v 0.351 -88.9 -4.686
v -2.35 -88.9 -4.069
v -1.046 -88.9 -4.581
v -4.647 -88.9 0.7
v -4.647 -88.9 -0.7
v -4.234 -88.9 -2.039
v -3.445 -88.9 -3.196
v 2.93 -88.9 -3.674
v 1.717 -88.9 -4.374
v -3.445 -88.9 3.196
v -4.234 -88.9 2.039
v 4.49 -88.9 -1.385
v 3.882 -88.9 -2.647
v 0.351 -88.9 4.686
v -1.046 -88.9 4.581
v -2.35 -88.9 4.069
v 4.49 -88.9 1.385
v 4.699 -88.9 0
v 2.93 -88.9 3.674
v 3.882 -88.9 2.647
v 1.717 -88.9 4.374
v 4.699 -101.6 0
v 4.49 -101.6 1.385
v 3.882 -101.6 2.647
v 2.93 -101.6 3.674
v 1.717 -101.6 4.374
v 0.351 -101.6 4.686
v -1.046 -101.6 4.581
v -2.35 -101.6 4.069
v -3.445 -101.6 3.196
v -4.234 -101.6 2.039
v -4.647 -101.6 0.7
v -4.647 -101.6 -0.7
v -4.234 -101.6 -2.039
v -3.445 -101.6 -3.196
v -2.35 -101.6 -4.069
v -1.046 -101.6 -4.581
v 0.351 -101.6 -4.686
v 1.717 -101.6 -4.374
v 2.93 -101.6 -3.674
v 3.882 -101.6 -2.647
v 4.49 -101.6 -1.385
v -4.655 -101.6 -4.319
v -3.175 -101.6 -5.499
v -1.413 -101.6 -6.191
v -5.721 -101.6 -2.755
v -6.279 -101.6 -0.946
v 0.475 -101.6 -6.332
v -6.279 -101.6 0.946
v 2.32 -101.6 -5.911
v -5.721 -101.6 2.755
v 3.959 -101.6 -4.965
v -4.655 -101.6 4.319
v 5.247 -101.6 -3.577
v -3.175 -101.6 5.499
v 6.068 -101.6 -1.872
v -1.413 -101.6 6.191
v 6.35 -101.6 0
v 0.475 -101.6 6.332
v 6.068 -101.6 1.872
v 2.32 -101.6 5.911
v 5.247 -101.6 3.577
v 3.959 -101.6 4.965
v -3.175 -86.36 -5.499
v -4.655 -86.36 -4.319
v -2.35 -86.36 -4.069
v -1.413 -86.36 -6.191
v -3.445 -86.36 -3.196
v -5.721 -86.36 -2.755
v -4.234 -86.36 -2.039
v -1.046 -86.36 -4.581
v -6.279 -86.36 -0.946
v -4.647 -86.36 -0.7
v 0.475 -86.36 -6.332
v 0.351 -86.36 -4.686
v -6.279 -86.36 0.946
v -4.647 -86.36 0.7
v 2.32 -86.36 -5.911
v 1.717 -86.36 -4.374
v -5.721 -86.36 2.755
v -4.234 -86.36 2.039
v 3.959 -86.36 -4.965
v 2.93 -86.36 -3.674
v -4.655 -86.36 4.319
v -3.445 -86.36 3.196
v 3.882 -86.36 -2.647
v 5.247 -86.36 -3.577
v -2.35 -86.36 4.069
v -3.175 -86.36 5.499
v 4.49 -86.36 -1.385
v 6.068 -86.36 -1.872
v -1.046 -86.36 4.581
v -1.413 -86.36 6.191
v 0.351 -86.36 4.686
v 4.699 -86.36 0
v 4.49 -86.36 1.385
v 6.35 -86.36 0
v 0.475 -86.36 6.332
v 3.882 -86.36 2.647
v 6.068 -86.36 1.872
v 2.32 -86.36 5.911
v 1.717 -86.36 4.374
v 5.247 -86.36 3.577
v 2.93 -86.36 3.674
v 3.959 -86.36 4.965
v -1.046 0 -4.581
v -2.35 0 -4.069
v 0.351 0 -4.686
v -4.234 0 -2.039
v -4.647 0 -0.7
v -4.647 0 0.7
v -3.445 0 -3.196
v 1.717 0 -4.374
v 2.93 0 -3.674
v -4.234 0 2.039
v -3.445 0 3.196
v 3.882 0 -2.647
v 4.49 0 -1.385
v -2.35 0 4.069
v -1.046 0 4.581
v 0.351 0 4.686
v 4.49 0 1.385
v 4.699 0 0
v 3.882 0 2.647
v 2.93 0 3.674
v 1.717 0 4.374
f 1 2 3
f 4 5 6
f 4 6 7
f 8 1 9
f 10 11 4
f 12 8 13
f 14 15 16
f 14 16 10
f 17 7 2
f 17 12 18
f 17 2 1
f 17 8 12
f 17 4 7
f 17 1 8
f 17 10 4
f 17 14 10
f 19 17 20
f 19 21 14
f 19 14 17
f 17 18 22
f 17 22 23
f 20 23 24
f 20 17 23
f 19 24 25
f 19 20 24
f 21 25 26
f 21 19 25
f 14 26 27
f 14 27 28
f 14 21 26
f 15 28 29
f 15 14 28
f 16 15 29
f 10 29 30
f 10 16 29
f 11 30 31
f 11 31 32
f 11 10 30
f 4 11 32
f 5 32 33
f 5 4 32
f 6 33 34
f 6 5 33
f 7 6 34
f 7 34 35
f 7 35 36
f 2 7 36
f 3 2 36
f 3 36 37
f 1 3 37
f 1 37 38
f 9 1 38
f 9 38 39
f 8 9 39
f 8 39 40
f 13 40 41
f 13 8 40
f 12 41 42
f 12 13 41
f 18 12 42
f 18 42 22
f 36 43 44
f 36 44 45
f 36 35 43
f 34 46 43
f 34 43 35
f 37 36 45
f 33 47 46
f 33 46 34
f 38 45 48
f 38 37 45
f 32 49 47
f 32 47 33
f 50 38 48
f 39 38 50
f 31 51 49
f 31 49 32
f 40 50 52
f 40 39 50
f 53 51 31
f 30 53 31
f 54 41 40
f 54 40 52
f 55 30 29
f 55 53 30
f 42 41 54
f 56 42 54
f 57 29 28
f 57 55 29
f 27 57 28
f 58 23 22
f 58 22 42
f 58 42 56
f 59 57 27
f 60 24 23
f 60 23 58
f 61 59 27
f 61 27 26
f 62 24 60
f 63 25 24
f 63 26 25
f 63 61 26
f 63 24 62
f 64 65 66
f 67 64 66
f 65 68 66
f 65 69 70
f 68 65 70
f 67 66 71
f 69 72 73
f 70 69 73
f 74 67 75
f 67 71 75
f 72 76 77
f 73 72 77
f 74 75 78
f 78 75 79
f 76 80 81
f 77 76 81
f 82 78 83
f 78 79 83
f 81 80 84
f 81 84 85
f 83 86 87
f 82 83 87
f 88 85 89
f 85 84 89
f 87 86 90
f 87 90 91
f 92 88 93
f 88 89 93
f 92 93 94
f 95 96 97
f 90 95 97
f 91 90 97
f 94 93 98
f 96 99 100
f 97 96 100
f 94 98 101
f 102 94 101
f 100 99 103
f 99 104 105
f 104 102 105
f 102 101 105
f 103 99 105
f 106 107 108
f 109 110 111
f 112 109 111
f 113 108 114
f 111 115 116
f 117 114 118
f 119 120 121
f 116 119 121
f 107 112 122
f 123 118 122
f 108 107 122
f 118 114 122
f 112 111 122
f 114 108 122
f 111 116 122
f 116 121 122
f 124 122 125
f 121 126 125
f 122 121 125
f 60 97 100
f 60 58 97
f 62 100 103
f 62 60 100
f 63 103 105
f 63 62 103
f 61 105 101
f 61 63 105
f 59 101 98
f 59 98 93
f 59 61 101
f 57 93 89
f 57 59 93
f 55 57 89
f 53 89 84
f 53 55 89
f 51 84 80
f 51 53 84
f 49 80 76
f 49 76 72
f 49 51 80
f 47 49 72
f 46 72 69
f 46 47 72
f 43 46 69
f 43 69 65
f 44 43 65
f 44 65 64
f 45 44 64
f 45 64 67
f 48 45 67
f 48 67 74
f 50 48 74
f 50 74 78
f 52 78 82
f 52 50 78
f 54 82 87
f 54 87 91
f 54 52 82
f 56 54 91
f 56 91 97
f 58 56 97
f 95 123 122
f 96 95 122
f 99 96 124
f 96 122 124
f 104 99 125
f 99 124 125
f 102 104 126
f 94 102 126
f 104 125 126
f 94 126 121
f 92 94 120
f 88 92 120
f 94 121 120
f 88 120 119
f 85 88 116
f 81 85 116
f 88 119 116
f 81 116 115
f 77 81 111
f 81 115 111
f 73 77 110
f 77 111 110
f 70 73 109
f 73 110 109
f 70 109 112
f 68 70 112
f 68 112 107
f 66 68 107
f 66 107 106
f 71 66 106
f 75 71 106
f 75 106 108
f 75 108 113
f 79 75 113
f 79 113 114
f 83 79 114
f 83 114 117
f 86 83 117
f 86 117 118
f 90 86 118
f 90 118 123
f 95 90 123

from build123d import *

# Parameters (mm, degrees)
F0_R     = 4.699
F1_DEPTH = 88.9
F2_R     = 6.35
F2_R_2   = 4.699
F3_DEPTH = 12.7
F4_DEPTH = 2.54


with BuildPart() as f1:
    # F0 (on Front) → F1 (new body)
    with BuildSketch(Plane.XZ):
        Circle(F0_R)
    extrude(amount=F1_DEPTH)

    # F2 (on face) → F3 (join)
    with BuildSketch(Plane.XZ.offset(88.9)):
        Circle(F2_R)
        Circle(F2_R_2, mode=Mode.SUBTRACT)
    extrude(amount=F3_DEPTH)

    # F4 (add): a face of the model
    f4_faces = [f1.faces().sort_by_distance(p)[0] for p in [
        (-6.1703948776, -88.9, 0),
    ]]
    extrude(f4_faces, amount=F4_DEPTH)


solid = f1.part
